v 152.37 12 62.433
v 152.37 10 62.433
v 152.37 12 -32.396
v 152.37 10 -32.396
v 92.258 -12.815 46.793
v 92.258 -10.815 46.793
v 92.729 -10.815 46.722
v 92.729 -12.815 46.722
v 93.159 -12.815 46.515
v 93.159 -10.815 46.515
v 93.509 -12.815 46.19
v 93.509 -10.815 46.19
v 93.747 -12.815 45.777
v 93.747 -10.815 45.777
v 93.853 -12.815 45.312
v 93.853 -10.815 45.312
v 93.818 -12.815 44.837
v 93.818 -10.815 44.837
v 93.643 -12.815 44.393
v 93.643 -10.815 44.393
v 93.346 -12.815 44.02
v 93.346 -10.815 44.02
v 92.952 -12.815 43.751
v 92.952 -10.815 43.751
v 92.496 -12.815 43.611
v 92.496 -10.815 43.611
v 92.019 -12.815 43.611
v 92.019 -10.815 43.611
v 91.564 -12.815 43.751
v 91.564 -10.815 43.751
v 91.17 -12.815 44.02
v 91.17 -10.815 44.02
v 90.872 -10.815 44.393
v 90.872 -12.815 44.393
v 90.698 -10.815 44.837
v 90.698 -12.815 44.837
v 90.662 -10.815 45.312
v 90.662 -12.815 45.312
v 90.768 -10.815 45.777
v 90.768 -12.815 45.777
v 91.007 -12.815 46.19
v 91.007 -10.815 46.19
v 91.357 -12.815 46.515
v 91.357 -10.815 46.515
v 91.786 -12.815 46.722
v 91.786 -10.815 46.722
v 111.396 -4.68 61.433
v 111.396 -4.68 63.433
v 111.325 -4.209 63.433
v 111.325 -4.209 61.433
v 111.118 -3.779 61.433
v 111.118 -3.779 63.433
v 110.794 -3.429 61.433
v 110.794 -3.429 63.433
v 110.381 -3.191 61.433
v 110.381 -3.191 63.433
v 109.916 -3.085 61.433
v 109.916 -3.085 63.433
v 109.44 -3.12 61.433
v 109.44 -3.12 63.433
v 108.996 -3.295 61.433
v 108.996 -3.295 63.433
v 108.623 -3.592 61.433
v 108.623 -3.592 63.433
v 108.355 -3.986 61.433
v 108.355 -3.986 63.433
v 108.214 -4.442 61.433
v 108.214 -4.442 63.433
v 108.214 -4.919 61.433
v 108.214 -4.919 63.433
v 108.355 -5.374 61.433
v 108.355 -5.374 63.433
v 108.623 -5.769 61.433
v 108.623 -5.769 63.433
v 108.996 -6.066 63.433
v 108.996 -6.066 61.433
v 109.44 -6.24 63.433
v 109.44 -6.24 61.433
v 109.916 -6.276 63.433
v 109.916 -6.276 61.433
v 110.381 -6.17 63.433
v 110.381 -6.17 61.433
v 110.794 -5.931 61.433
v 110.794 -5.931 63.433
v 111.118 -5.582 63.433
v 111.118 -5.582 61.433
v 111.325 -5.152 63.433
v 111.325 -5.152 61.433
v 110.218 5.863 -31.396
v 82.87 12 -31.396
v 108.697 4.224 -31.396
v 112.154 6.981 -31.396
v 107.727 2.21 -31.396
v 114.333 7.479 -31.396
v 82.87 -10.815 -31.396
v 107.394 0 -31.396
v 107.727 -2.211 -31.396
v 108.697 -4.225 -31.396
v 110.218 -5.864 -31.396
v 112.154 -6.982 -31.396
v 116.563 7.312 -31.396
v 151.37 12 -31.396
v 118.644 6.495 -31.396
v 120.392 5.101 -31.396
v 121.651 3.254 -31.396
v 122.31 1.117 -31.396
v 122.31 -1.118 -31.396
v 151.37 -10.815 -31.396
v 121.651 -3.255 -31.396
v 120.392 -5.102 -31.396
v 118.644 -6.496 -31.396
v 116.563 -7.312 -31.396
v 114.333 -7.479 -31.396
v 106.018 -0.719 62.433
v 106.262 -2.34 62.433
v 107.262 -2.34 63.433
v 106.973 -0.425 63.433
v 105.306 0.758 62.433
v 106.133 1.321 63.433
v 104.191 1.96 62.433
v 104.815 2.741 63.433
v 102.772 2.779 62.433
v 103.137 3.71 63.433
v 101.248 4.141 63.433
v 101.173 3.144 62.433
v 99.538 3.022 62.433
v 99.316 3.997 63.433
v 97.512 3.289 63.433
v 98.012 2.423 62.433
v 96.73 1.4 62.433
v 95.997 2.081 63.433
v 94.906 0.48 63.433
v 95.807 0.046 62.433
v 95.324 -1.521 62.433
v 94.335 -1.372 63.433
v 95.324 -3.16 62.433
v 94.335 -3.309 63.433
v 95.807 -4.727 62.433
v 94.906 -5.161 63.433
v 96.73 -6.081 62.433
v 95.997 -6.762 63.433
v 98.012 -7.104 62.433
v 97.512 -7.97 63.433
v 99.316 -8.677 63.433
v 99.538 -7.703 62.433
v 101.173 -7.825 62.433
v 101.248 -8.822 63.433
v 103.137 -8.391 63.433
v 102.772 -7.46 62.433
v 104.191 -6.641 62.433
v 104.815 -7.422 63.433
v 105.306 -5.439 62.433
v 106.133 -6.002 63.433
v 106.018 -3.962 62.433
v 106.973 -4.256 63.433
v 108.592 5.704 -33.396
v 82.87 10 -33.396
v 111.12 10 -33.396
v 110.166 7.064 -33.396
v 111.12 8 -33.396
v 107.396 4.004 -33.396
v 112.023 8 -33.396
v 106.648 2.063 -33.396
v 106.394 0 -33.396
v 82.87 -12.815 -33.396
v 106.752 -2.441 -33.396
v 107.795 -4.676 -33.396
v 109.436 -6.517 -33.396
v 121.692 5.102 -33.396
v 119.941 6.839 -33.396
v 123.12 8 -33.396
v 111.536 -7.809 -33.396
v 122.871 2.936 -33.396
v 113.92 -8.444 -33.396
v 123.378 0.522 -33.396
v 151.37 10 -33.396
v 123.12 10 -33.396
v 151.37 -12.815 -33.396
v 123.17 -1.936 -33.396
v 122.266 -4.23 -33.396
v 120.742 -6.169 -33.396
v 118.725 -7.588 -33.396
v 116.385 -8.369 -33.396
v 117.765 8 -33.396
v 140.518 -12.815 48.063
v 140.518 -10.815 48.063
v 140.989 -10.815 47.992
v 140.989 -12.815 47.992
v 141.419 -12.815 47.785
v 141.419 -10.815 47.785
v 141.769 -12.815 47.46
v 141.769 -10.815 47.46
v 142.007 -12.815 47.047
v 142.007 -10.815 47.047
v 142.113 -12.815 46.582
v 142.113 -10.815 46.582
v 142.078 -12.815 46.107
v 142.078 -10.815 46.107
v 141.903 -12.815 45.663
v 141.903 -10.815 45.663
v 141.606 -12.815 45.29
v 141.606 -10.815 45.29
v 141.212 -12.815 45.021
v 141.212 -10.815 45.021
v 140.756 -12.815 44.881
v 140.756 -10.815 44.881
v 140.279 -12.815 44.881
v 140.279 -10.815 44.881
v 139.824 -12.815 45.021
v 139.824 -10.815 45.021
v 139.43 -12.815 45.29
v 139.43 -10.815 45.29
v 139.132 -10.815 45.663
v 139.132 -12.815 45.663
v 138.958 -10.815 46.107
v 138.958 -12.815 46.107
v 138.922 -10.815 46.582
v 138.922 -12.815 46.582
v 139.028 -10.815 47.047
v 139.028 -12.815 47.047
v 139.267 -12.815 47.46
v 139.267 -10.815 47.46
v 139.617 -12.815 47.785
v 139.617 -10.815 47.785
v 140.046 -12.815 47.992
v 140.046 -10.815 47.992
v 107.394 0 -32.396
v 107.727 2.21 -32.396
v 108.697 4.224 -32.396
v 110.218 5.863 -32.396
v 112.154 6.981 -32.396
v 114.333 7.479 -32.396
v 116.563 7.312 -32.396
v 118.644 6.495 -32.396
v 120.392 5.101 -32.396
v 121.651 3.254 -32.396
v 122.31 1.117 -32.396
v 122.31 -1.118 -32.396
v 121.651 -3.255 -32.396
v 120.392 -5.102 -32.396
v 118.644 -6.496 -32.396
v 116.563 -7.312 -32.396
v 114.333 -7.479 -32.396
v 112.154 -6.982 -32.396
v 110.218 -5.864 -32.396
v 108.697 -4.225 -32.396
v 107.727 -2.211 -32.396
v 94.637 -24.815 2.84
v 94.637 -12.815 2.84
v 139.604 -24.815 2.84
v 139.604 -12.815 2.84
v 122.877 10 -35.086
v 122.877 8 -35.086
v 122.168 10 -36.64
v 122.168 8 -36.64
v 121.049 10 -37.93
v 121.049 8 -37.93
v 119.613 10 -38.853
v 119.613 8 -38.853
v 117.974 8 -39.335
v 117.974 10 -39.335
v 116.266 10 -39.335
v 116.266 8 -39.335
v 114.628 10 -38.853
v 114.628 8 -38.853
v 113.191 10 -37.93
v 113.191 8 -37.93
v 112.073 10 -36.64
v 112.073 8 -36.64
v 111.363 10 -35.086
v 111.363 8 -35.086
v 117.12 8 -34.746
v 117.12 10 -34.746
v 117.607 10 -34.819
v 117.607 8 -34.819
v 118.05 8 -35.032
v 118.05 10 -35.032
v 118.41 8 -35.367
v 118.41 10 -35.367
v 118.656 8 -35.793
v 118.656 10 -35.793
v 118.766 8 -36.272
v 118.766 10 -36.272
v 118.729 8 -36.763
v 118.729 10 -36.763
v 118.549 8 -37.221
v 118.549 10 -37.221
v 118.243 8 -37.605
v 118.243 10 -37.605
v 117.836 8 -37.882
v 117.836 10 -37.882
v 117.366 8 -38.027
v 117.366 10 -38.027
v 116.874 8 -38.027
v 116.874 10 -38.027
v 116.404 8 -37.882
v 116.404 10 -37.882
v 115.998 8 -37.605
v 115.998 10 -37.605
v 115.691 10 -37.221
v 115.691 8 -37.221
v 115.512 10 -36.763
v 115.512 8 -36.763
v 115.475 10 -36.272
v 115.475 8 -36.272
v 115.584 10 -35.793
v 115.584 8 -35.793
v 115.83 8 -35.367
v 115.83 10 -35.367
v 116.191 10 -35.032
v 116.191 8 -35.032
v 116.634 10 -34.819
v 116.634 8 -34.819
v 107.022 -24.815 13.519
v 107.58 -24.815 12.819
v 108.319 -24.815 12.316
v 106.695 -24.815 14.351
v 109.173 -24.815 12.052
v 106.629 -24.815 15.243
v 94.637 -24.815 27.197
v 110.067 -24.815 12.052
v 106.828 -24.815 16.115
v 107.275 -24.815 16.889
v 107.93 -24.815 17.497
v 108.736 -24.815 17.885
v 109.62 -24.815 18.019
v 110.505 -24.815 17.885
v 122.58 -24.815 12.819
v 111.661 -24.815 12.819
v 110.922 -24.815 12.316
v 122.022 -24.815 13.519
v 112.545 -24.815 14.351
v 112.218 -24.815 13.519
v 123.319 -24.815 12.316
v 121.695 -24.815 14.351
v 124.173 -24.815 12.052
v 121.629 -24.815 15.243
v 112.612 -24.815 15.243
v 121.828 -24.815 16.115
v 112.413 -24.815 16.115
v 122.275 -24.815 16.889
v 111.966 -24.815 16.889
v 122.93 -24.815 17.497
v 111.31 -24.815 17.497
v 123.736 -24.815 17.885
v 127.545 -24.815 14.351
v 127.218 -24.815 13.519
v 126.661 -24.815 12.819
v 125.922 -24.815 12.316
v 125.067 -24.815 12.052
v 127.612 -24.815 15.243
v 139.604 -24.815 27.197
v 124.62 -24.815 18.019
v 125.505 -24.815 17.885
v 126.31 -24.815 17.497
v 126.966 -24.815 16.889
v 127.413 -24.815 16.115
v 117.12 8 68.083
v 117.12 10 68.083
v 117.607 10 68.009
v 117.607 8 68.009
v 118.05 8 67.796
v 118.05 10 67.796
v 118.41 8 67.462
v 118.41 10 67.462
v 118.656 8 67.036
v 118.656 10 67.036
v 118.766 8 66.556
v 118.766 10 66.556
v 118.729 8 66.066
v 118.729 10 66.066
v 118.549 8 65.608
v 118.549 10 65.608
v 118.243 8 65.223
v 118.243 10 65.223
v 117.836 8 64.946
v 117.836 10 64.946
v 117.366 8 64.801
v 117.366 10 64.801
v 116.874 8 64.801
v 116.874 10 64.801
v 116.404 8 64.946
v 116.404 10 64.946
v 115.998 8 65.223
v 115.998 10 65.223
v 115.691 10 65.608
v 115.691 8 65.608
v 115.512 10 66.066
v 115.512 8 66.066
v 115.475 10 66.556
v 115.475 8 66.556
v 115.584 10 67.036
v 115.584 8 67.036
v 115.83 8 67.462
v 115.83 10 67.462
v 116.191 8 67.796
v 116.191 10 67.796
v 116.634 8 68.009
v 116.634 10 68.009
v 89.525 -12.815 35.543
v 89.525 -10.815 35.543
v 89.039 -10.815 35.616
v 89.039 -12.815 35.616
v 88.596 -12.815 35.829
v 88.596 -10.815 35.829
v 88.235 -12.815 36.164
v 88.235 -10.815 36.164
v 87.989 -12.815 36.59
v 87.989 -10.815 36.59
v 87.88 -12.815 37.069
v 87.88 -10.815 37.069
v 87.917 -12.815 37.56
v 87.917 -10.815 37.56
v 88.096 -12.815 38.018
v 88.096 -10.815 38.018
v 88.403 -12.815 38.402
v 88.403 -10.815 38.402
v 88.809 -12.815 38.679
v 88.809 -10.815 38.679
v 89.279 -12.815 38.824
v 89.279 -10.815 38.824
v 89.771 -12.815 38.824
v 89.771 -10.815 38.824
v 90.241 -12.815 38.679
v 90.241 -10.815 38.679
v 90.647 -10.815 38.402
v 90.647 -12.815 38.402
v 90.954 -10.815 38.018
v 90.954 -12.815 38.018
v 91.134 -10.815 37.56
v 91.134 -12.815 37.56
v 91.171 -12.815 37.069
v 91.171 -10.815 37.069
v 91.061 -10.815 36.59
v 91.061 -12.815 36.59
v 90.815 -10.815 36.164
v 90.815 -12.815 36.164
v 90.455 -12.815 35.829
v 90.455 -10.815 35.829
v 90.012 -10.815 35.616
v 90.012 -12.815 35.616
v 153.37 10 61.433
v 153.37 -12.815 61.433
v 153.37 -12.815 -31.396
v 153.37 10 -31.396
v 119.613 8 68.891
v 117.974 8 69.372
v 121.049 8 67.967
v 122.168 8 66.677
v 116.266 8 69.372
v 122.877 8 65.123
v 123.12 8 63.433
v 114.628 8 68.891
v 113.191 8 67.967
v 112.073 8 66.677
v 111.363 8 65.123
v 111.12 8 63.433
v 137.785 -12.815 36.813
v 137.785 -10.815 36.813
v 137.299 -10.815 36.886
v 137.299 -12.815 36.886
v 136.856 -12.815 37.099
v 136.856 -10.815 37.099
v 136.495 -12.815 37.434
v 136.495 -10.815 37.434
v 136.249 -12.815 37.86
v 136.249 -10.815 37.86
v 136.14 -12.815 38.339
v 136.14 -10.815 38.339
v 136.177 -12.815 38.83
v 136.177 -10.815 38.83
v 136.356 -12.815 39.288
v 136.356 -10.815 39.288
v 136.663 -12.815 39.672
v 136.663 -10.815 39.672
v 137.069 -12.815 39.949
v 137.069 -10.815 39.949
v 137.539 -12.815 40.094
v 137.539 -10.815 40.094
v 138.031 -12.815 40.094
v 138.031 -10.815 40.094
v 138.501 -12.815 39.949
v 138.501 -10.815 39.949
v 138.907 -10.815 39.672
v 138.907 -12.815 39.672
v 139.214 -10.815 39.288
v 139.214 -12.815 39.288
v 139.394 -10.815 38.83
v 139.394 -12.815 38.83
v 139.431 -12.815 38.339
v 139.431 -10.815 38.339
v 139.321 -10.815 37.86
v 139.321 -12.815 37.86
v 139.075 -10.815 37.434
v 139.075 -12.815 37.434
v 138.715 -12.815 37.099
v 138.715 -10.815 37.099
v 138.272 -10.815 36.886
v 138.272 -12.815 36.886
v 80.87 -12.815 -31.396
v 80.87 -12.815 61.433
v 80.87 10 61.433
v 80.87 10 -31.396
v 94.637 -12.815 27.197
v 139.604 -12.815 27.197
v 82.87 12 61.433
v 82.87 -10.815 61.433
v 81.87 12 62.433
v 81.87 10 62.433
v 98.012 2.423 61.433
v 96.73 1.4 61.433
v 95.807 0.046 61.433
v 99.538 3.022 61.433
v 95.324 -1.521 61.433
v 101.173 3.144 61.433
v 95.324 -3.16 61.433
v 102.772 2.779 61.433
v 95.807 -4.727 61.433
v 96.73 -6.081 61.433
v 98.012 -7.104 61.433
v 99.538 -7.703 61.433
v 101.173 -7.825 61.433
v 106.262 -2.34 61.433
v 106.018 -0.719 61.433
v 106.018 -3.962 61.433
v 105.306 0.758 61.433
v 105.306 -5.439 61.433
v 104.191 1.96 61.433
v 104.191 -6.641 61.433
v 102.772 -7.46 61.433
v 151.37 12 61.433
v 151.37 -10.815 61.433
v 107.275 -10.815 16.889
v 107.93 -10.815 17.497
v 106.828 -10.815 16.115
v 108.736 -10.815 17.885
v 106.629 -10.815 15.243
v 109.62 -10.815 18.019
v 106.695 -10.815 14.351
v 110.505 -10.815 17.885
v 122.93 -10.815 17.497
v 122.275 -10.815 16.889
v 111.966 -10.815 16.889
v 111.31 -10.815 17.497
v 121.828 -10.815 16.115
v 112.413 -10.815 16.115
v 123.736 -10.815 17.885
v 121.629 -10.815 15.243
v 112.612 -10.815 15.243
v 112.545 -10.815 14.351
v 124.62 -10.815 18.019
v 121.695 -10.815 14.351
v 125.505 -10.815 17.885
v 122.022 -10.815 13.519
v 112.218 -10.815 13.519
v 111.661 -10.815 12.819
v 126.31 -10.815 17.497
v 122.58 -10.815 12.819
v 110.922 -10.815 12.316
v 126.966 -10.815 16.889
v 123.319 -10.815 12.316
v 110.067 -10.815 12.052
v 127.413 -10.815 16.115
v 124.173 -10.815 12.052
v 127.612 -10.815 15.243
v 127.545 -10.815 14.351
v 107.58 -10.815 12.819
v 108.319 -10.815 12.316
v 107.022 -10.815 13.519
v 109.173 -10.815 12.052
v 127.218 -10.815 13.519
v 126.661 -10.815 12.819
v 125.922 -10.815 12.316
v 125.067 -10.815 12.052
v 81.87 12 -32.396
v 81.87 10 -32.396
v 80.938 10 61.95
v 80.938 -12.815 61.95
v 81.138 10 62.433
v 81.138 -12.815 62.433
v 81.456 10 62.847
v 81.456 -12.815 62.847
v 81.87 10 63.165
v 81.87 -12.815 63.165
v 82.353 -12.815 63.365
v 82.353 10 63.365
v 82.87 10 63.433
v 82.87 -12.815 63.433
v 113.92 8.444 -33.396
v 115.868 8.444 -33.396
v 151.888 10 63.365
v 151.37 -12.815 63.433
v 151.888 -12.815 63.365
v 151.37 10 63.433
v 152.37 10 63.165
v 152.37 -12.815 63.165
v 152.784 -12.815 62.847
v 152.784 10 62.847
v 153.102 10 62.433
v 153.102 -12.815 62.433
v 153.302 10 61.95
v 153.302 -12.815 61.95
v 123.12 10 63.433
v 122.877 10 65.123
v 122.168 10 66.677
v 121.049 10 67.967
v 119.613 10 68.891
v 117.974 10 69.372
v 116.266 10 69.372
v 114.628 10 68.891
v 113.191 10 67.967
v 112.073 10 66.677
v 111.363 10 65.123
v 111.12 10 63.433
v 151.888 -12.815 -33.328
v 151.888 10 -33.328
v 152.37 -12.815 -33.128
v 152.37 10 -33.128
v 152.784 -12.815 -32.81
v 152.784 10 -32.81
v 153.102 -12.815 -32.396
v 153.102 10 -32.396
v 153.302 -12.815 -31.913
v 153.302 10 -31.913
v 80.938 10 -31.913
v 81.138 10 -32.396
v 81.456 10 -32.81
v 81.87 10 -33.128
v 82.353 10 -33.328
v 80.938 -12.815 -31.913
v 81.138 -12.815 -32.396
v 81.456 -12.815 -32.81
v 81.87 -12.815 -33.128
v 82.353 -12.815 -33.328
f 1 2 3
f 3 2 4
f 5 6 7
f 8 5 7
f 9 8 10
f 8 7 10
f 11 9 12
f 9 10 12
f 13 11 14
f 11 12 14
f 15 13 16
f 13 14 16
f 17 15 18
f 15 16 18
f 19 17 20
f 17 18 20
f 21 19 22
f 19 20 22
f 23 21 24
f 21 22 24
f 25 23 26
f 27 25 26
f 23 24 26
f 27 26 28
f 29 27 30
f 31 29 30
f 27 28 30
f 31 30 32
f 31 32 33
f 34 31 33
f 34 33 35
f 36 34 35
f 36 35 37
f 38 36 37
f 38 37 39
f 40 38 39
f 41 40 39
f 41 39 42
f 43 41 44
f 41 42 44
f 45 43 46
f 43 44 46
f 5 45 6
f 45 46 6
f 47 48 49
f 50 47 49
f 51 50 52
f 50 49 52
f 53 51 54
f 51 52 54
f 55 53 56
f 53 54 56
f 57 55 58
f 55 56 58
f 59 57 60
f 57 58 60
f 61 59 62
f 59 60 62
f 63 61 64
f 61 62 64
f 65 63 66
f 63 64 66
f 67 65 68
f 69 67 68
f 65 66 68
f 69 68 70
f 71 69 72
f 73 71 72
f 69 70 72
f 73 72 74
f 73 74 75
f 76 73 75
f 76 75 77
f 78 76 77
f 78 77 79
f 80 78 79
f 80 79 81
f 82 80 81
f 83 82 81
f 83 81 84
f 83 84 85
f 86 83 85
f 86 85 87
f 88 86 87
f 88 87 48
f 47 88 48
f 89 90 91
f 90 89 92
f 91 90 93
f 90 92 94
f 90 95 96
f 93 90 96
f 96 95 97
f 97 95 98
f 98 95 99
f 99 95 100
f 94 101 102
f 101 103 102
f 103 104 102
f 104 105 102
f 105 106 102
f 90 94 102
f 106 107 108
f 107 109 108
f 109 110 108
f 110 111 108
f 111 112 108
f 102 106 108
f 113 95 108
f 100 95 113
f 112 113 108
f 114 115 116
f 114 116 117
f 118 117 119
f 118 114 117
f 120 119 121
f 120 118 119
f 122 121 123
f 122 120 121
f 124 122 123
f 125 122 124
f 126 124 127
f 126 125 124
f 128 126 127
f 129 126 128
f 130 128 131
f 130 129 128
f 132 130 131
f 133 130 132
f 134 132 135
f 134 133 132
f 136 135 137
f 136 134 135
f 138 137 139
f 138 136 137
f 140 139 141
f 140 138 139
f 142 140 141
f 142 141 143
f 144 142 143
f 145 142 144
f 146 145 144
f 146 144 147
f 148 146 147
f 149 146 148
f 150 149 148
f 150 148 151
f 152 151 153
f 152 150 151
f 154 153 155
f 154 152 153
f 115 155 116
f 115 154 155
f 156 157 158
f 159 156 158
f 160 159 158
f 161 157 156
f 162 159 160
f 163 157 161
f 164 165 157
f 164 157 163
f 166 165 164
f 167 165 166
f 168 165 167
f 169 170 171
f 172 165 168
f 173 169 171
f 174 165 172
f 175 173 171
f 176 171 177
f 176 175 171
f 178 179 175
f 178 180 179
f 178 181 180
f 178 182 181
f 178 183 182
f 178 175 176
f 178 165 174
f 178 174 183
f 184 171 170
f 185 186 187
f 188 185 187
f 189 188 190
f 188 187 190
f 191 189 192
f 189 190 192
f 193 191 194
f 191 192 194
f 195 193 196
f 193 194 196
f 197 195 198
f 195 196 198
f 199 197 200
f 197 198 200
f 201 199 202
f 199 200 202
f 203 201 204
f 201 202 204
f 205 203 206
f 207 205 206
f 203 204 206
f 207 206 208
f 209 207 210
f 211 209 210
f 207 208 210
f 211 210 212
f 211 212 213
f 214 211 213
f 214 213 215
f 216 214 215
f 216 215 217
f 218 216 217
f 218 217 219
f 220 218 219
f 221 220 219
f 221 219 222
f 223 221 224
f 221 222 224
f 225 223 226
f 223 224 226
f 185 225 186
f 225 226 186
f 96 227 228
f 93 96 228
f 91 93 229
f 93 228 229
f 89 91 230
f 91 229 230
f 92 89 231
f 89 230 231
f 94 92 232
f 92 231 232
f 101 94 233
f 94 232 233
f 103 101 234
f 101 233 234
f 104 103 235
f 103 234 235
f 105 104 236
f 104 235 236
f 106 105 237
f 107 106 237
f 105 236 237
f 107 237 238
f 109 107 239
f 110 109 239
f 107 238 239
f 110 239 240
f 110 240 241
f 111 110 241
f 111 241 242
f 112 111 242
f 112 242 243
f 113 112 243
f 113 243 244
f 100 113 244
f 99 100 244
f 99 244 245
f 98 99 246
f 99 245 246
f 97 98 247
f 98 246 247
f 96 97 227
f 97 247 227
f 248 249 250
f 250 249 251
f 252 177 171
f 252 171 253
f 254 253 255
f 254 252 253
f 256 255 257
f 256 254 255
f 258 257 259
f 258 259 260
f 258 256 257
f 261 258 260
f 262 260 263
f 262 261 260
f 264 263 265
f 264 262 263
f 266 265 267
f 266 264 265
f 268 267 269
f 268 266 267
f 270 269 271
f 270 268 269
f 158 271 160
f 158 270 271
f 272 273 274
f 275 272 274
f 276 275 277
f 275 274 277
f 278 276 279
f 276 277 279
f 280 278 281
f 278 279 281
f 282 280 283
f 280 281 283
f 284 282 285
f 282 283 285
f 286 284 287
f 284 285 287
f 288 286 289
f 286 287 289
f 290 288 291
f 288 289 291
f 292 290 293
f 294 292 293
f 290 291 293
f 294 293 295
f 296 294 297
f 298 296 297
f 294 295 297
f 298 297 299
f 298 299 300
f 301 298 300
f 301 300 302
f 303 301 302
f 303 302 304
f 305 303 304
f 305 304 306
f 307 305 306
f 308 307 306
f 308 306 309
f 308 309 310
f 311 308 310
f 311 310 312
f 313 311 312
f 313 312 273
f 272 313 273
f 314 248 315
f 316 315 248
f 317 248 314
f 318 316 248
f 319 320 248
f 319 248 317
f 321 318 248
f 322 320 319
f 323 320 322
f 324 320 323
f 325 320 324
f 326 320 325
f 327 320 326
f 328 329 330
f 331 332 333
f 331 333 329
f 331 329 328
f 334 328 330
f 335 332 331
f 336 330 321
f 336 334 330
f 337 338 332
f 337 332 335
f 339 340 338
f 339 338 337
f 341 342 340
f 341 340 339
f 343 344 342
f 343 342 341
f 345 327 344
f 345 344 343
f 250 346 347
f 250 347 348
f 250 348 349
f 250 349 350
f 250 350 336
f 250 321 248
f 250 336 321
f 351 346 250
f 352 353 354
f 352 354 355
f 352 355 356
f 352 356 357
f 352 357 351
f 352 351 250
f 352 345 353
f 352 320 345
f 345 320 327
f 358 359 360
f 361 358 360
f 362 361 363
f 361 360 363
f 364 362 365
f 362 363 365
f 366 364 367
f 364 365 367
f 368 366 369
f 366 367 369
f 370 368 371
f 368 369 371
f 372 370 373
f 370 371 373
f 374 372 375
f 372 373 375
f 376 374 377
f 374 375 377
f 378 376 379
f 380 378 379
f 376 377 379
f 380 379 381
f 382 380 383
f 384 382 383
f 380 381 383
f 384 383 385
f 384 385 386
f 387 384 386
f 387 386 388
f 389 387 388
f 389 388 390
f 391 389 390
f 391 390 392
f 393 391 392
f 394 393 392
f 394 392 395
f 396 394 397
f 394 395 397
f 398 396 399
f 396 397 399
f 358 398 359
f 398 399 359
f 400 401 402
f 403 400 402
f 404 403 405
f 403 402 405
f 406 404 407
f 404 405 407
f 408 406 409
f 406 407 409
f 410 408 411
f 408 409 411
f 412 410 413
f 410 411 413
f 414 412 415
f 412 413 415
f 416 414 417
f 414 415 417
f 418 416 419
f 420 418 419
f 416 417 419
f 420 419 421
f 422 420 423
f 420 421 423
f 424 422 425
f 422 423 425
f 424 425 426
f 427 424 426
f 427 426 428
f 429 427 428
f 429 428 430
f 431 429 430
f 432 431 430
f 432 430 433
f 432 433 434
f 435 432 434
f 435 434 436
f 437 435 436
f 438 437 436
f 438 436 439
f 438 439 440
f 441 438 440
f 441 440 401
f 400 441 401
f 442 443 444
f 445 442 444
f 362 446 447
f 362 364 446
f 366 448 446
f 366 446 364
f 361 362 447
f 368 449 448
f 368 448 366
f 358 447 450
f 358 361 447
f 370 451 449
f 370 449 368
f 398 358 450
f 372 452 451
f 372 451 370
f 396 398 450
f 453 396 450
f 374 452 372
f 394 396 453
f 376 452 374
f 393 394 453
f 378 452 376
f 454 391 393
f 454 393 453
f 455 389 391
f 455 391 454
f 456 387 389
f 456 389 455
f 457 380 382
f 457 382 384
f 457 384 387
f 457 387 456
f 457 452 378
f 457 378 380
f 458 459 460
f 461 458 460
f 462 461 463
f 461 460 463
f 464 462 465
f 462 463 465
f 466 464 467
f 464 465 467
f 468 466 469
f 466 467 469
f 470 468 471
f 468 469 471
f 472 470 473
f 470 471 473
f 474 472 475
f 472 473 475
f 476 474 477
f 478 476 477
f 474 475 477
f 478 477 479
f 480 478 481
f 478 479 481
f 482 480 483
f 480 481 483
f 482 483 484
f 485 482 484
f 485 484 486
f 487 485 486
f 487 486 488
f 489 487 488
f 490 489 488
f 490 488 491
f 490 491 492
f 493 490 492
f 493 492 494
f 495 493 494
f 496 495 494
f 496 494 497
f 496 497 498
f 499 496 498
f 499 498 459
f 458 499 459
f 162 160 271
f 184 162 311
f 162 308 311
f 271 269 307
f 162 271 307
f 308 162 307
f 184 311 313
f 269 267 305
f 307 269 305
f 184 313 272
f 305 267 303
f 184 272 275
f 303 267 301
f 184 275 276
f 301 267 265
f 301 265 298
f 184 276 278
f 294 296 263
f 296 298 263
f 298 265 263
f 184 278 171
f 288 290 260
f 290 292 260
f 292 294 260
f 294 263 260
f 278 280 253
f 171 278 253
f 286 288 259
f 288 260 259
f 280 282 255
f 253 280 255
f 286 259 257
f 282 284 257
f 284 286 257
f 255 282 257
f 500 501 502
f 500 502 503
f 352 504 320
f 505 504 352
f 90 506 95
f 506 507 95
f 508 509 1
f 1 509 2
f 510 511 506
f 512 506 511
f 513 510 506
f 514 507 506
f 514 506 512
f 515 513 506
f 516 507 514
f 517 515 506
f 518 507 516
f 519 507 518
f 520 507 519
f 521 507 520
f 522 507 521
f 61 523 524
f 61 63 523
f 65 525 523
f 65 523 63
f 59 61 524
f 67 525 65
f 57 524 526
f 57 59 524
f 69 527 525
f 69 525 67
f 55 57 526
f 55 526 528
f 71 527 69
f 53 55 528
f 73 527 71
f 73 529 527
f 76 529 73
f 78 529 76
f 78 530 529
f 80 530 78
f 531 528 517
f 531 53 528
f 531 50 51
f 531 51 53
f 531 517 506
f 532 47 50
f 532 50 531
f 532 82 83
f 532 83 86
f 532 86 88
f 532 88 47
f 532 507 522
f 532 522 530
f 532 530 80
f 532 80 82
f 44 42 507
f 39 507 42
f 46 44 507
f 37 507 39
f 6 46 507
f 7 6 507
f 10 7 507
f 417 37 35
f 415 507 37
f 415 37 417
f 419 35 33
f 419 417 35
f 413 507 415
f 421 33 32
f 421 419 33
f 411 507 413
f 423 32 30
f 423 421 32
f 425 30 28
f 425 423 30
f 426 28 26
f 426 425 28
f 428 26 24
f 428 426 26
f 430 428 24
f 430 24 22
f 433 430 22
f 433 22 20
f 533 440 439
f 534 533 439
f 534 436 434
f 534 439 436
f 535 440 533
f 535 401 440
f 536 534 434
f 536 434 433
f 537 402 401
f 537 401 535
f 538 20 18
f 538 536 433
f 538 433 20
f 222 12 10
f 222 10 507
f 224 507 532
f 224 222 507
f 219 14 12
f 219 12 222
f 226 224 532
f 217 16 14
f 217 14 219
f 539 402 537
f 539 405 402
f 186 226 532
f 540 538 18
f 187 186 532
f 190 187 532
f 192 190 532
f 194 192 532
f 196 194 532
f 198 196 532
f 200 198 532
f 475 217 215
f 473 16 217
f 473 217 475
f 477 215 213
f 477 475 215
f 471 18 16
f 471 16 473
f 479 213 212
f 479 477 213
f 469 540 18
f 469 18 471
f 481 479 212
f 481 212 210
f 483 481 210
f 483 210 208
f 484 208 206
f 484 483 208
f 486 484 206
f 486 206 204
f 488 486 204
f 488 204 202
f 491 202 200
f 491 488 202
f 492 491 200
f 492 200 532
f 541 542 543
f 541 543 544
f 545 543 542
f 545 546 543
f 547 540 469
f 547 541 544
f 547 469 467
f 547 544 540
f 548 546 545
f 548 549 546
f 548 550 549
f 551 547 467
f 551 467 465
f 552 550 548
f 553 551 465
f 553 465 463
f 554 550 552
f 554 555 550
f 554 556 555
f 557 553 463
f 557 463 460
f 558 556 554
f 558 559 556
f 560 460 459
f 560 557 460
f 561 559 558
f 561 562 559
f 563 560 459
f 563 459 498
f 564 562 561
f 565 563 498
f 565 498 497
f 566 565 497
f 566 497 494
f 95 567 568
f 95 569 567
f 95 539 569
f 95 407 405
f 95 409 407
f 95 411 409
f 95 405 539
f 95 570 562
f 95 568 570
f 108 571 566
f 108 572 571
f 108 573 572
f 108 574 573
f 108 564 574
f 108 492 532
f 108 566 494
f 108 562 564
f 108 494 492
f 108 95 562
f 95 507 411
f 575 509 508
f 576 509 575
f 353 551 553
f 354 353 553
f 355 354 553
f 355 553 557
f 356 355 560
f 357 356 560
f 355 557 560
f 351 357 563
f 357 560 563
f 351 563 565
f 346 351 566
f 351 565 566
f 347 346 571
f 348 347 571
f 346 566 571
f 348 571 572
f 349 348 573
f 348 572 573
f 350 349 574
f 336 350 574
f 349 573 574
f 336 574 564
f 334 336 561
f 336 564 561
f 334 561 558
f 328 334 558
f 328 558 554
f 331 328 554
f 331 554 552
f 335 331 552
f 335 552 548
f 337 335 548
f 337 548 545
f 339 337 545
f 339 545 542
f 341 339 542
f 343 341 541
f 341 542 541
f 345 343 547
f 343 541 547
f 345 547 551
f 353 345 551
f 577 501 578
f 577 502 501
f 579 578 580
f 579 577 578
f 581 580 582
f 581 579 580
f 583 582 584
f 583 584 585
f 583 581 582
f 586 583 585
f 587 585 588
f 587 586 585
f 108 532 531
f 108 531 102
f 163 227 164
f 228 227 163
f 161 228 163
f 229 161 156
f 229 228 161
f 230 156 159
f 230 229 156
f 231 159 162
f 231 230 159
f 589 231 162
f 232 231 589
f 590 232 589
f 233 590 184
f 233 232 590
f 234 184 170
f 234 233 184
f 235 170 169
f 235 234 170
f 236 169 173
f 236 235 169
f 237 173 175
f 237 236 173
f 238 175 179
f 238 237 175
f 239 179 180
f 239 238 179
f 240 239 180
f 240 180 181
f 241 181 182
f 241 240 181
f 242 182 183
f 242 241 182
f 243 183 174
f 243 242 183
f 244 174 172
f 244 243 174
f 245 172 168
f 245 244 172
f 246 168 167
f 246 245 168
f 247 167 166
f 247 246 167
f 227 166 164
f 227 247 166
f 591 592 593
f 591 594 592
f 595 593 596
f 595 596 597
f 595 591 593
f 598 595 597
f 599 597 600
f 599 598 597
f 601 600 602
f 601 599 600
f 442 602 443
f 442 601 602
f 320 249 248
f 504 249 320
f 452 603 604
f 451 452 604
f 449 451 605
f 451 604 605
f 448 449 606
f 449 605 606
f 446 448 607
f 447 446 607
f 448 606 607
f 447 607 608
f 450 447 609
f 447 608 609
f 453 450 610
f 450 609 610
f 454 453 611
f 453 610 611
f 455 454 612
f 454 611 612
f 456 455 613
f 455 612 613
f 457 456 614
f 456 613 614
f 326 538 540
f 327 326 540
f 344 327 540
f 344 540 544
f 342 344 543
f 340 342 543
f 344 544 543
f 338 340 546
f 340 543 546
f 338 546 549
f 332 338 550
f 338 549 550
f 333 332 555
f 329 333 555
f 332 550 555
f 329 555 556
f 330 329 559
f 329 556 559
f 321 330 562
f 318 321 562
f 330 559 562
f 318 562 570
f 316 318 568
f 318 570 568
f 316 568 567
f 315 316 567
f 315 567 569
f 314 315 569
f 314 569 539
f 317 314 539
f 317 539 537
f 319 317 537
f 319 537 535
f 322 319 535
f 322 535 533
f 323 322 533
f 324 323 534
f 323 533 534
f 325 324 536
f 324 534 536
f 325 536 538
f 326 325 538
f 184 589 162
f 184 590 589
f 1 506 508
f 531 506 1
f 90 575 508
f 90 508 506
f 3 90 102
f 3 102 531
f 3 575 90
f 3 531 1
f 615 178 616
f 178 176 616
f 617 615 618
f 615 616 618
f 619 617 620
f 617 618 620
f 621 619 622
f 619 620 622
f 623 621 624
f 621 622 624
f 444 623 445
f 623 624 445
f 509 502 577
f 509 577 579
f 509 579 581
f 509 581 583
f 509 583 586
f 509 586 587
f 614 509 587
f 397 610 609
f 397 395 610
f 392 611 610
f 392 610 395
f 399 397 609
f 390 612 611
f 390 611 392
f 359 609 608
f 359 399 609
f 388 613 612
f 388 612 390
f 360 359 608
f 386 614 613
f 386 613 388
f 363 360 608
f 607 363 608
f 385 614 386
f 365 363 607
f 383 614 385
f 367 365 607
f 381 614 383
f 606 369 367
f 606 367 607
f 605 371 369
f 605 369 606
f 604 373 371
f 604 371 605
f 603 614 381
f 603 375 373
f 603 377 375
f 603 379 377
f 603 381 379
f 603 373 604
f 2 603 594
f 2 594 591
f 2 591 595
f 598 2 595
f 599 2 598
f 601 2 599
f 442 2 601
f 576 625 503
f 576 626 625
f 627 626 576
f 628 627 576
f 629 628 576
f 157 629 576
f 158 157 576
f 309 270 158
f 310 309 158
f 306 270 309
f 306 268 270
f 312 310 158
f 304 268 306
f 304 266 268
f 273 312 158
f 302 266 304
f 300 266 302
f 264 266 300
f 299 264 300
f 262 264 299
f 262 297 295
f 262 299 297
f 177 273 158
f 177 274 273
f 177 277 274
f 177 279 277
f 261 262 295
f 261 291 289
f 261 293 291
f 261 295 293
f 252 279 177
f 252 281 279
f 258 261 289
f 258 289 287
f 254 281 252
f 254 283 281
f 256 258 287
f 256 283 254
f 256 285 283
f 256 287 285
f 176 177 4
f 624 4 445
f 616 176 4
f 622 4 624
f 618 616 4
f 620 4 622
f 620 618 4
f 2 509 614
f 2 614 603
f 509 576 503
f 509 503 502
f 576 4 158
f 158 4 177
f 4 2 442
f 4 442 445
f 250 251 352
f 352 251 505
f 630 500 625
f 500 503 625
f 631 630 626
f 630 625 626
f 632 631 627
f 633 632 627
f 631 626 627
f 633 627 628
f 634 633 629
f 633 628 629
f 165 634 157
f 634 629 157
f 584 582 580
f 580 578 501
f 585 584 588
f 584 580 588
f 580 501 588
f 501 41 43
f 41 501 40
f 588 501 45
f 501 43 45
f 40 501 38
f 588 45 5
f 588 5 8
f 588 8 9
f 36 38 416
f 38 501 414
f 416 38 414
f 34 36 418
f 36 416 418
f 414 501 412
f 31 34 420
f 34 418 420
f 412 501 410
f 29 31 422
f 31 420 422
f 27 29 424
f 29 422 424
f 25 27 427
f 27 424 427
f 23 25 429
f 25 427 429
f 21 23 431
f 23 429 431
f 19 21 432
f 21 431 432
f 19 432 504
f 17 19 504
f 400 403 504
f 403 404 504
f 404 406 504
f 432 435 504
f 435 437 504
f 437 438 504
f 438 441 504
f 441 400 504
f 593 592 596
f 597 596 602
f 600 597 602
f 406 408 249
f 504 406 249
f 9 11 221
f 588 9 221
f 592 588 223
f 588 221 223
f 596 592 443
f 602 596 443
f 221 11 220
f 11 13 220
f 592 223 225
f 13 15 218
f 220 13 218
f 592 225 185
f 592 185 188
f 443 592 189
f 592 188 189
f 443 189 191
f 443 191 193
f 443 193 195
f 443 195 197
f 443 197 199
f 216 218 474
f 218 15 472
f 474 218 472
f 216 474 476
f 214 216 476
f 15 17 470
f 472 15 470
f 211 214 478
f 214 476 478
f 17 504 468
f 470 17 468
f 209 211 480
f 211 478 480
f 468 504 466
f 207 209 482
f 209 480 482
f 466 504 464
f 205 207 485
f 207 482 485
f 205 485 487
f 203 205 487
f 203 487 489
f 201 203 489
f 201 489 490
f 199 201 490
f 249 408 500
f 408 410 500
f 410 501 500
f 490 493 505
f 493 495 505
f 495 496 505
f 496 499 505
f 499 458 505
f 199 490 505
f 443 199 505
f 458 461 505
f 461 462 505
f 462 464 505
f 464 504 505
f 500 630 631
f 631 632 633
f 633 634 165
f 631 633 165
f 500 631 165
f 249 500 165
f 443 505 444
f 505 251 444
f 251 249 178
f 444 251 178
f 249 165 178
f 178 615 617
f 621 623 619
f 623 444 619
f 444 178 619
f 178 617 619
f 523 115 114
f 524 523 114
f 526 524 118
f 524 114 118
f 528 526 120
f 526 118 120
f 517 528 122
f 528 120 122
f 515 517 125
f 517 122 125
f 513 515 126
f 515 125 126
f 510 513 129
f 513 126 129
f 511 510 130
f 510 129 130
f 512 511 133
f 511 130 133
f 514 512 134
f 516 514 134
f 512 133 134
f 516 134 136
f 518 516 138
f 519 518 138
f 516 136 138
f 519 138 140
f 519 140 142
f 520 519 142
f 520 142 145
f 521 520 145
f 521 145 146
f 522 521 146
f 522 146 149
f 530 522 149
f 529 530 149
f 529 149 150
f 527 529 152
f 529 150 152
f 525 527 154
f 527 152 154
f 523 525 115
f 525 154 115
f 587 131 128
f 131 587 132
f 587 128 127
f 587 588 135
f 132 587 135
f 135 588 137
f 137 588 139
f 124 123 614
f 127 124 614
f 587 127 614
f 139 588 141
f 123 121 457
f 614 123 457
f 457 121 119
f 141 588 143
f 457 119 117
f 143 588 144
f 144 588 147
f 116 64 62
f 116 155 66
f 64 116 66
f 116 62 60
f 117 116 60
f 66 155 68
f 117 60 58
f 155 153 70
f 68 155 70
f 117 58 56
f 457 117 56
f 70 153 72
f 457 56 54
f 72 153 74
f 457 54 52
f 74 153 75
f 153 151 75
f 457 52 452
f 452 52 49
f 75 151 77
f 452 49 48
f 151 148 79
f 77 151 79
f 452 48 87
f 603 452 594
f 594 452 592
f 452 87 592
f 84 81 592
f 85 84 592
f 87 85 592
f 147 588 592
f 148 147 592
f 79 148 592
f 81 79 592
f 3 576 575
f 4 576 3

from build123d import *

# Parameters (mm, degrees)
BOSS_EXTRUDE1_DEPTH      = 18
BOSS_EXTRUDE1_DEPTH_BACK = 12.815459
SKETCH1_W                = 72.5
SKETCH1_H                = 96.828401578
SHELL1_T                 = 2
SKETCH2_R                = 7.5
CUT_EXTRUDE1_DEPTH       = 2
CHAMFER1_SIZE            = 1
SKETCH5_R                = 5.5
CUT_EXTRUDE2_DEPTH       = 2
CHAMFER2_SIZE            = 1
SKETCH8_W                = 72.5
SKETCH8_H                = 96.828401578
CUT_EXTRUDE5_DEPTH       = 8
BOSS_EXTRUDE3_START      = 10
SKETCH10_W               = 70.5
SKETCH10_H               = 94.828401578
SKETCH10_W_2             = 68.5
SKETCH10_H_2             = 92.828401578
BOSS_EXTRUDE3_DEPTH      = 2
CUT_EXTRUDE6_REACH       = 183.831
SKETCH12_R               = 1.6
FILLET1_R                = 2
BOSS_EXTRUDE4_START      = 10
SKETCH13_R               = 1.65
BOSS_EXTRUDE4_DEPTH      = 2
SKETCH16_R               = 1.65
BOSS_EXTRUDE5_DEPTH      = 2
SKETCH17_R               = 1.65
CUT_EXTRUDE8_DEPTH       = 12.81545914
SKETCH19_W               = 44.967113154
SKETCH19_H               = 24.357186292
BOSS_EXTRUDE6_DEPTH      = 12
CUT_EXTRUDE9_START       = -10.815459
SKETCH18_R               = 3
CUT_EXTRUDE9_DEPTH       = 14
SKETCH14_R               = 1.599946
CUT_EXTRUDE7_DEPTH       = 2


with BuildPart() as part:
    # Sketch1 → Boss-Extrude1 (new, two sides: drawn at the far end of the back side and taken through both)
    with BuildSketch(Plane(origin=(0, 0, 0), x_dir=(1, 0, 0), z_dir=(0, 1, 0)).offset(-BOSS_EXTRUDE1_DEPTH_BACK)):
        with Locations((117.12025684, -15.018542133)):
            Rectangle(SKETCH1_W, SKETCH1_H)
    extrude(amount=BOSS_EXTRUDE1_DEPTH + BOSS_EXTRUDE1_DEPTH_BACK)

    # Shell1 (no face opened: a closed hollow body)
    add(offset(amount=-SHELL1_T, mode=Mode.PRIVATE), mode=Mode.SUBTRACT)

    # Sketch2 → Cut-Extrude1 (cut)
    with BuildSketch(Plane(origin=(0, 0, -33.395658656), x_dir=(-1, 0, 0), z_dir=(0, 0, -1))):
        with Locations((-114.89374317, -0.00045914)):
            Circle(SKETCH2_R)
    extrude(amount=-CUT_EXTRUDE1_DEPTH, mode=Mode.SUBTRACT)

    # Chamfer1
    chamfer1_edges = [part.edges().sort_by_distance(p)[0] for p in [
        (122.39374317, -0.00045914, -33.395658656),
    ]]
    chamfer(chamfer1_edges, length=CHAMFER1_SIZE)

    # Sketch5 → Cut-Extrude2 (cut)
    with BuildSketch(Plane.XY.offset(63.432742922)):
        with Locations((100.762134065, -2.34045914)):
            Circle(SKETCH5_R)
    extrude(amount=-CUT_EXTRUDE2_DEPTH, mode=Mode.SUBTRACT)

    # Chamfer2
    chamfer2_edges = [part.edges().sort_by_distance(p)[0] for p in [
        (95.262134065, -2.34045914, 63.432742922),
    ]]
    chamfer(chamfer2_edges, length=CHAMFER2_SIZE)

    # Sketch8 → Cut-Extrude5 (cut)
    with BuildSketch(Plane(origin=(0, 18, 0), x_dir=(1, 0, 0), z_dir=(0, 1, 0))):
        with Locations((117.12025684, -15.018542133)):
            Rectangle(SKETCH8_W, SKETCH8_H)
    extrude(amount=-CUT_EXTRUDE5_DEPTH, mode=Mode.SUBTRACT)

    # Sketch10 → Boss-Extrude3 (add)
    with BuildSketch(Plane(origin=(0, 0, 0), x_dir=(1, 0, 0), z_dir=(0, 1, 0)).offset(BOSS_EXTRUDE3_START)):
        with Locations((117.12025684, -15.018542133)):
            Rectangle(SKETCH10_W, SKETCH10_H)
        with Locations((117.12025684, -15.018542133)):
            Rectangle(SKETCH10_W_2, SKETCH10_H_2, mode=Mode.SUBTRACT)
    extrude(amount=BOSS_EXTRUDE3_DEPTH)

    # Sketch12 → Cut-Extrude6 (cut, up to next)
    with BuildSketch(Plane.XY.offset(63.432742922), mode=Mode.PRIVATE) as cut_extrude6_sk1:
        with Locations((109.796270245, -4.680244976)):
            Circle(SKETCH12_R)
    cut_extrude6_tool1 = extrude(cut_extrude6_sk1.sketch, amount=-CUT_EXTRUDE6_REACH, mode=Mode.PRIVATE) & part.part
    add(cut_extrude6_tool1.solids().sort_by_distance((109.79627, -4.680245, 63.432743))[0], mode=Mode.SUBTRACT)

    # Fillet1
    fillet1_edges = [part.edges().sort_by_distance(p)[0] for p in [
        (80.87025684, -1.4077295, -33.395658656),
        (153.37025684, -1.4077295, -33.395658656),
        (153.37025684, -1.4077295, 63.432742922),
        (80.87025684, -1.4077295, 63.432742922),
    ]]
    fillet(fillet1_edges, radius=FILLET1_R)

    # Sketch13 → Boss-Extrude4 (add)
    with BuildSketch(Plane(origin=(0, 0, 0), x_dir=(1, 0, 0), z_dir=(0, 1, 0)).offset(BOSS_EXTRUDE4_START)):
        with BuildLine():
            Line((111.12025684, -63.432742922), (123.12025684, -63.432742922))
            ThreePointArc((123.12025684, -63.432742922), (117.12025684, -69.432742922), (111.12025684, -63.432742922))
        make_face()
        with Locations(Location((117.12025684, -66.432742922, 0), (0, 0, 270))):
            Circle(SKETCH13_R, mode=Mode.SUBTRACT)
    boss_extrude4 = extrude(amount=-BOSS_EXTRUDE4_DEPTH)

    # Sketch16 → Boss-Extrude5 (add)
    with BuildSketch(Plane(origin=(0, 10, 0), x_dir=(1, 0, 0), z_dir=(0, 1, 0))):
        with BuildLine():
            Line((111.12025684, 33.395658656), (123.12025684, 33.395658656))
            ThreePointArc((123.12025684, 33.395658656), (117.12025684, 39.395658656), (111.12025684, 33.395658656))
        make_face()
        with Locations(Location((117.12025684, 36.395658656, 0), (0, 0, 270))):
            Circle(SKETCH16_R, mode=Mode.SUBTRACT)
    extrude(amount=-BOSS_EXTRUDE5_DEPTH)

    # Sketch17 → Cut-Extrude8 (cut)
    with BuildSketch(Plane(origin=(0, 0, 0), x_dir=(1, 0, 0), z_dir=(0, 1, 0))):
        with Locations(Location((137.785174065, -38.462742922, 0), (0, 0, 90))):
            Circle(SKETCH17_R)
        with Locations(Location((89.525174065, -37.192742922, 0), (0, 0, 90))):
            Circle(SKETCH17_R)
    extrude(amount=-CUT_EXTRUDE8_DEPTH, mode=Mode.SUBTRACT)

    # Sketch19 → Boss-Extrude6 (add)
    with BuildSketch(Plane.XZ.offset(12.81545914)):
        with Locations((117.12025684, 15.018542133)):
            Rectangle(SKETCH19_W, SKETCH19_H)
    extrude(amount=BOSS_EXTRUDE6_DEPTH)

    # Sketch18 → Cut-Extrude9 (cut)
    with BuildSketch(Plane(origin=(0, 0, 0), x_dir=(1, 0, 0), z_dir=(0, 1, 0)).offset(CUT_EXTRUDE9_START)):
        with Locations(Location((124.62025684, -15.018542133, 0), (0, 0, 270))):
            Circle(SKETCH18_R)
        with Locations(Location((109.62025684, -15.018542133, 0), (0, 0, 270))):
            Circle(SKETCH18_R)
    extrude(amount=-CUT_EXTRUDE9_DEPTH, mode=Mode.SUBTRACT)

    # Mirror1: Boss-Extrude4 across plane
    add(boss_extrude4.mirror(Plane.XY.offset(15.018542133)))

    # Sketch14 → Cut-Extrude7 (cut)
    with BuildSketch(Plane(origin=(0, -10.81545914, 0), x_dir=(1, 0, 0), z_dir=(0, 1, 0))):
        with Locations(Location((140.517827737, -46.462742922, 0), (0, 0, 270))):
            Circle(SKETCH14_R)
        with Locations(Location((92.257827737, -45.192742922, 0), (0, 0, 270))):
            Circle(SKETCH14_R)
    extrude(amount=-CUT_EXTRUDE7_DEPTH, mode=Mode.SUBTRACT)


solid = part.part
